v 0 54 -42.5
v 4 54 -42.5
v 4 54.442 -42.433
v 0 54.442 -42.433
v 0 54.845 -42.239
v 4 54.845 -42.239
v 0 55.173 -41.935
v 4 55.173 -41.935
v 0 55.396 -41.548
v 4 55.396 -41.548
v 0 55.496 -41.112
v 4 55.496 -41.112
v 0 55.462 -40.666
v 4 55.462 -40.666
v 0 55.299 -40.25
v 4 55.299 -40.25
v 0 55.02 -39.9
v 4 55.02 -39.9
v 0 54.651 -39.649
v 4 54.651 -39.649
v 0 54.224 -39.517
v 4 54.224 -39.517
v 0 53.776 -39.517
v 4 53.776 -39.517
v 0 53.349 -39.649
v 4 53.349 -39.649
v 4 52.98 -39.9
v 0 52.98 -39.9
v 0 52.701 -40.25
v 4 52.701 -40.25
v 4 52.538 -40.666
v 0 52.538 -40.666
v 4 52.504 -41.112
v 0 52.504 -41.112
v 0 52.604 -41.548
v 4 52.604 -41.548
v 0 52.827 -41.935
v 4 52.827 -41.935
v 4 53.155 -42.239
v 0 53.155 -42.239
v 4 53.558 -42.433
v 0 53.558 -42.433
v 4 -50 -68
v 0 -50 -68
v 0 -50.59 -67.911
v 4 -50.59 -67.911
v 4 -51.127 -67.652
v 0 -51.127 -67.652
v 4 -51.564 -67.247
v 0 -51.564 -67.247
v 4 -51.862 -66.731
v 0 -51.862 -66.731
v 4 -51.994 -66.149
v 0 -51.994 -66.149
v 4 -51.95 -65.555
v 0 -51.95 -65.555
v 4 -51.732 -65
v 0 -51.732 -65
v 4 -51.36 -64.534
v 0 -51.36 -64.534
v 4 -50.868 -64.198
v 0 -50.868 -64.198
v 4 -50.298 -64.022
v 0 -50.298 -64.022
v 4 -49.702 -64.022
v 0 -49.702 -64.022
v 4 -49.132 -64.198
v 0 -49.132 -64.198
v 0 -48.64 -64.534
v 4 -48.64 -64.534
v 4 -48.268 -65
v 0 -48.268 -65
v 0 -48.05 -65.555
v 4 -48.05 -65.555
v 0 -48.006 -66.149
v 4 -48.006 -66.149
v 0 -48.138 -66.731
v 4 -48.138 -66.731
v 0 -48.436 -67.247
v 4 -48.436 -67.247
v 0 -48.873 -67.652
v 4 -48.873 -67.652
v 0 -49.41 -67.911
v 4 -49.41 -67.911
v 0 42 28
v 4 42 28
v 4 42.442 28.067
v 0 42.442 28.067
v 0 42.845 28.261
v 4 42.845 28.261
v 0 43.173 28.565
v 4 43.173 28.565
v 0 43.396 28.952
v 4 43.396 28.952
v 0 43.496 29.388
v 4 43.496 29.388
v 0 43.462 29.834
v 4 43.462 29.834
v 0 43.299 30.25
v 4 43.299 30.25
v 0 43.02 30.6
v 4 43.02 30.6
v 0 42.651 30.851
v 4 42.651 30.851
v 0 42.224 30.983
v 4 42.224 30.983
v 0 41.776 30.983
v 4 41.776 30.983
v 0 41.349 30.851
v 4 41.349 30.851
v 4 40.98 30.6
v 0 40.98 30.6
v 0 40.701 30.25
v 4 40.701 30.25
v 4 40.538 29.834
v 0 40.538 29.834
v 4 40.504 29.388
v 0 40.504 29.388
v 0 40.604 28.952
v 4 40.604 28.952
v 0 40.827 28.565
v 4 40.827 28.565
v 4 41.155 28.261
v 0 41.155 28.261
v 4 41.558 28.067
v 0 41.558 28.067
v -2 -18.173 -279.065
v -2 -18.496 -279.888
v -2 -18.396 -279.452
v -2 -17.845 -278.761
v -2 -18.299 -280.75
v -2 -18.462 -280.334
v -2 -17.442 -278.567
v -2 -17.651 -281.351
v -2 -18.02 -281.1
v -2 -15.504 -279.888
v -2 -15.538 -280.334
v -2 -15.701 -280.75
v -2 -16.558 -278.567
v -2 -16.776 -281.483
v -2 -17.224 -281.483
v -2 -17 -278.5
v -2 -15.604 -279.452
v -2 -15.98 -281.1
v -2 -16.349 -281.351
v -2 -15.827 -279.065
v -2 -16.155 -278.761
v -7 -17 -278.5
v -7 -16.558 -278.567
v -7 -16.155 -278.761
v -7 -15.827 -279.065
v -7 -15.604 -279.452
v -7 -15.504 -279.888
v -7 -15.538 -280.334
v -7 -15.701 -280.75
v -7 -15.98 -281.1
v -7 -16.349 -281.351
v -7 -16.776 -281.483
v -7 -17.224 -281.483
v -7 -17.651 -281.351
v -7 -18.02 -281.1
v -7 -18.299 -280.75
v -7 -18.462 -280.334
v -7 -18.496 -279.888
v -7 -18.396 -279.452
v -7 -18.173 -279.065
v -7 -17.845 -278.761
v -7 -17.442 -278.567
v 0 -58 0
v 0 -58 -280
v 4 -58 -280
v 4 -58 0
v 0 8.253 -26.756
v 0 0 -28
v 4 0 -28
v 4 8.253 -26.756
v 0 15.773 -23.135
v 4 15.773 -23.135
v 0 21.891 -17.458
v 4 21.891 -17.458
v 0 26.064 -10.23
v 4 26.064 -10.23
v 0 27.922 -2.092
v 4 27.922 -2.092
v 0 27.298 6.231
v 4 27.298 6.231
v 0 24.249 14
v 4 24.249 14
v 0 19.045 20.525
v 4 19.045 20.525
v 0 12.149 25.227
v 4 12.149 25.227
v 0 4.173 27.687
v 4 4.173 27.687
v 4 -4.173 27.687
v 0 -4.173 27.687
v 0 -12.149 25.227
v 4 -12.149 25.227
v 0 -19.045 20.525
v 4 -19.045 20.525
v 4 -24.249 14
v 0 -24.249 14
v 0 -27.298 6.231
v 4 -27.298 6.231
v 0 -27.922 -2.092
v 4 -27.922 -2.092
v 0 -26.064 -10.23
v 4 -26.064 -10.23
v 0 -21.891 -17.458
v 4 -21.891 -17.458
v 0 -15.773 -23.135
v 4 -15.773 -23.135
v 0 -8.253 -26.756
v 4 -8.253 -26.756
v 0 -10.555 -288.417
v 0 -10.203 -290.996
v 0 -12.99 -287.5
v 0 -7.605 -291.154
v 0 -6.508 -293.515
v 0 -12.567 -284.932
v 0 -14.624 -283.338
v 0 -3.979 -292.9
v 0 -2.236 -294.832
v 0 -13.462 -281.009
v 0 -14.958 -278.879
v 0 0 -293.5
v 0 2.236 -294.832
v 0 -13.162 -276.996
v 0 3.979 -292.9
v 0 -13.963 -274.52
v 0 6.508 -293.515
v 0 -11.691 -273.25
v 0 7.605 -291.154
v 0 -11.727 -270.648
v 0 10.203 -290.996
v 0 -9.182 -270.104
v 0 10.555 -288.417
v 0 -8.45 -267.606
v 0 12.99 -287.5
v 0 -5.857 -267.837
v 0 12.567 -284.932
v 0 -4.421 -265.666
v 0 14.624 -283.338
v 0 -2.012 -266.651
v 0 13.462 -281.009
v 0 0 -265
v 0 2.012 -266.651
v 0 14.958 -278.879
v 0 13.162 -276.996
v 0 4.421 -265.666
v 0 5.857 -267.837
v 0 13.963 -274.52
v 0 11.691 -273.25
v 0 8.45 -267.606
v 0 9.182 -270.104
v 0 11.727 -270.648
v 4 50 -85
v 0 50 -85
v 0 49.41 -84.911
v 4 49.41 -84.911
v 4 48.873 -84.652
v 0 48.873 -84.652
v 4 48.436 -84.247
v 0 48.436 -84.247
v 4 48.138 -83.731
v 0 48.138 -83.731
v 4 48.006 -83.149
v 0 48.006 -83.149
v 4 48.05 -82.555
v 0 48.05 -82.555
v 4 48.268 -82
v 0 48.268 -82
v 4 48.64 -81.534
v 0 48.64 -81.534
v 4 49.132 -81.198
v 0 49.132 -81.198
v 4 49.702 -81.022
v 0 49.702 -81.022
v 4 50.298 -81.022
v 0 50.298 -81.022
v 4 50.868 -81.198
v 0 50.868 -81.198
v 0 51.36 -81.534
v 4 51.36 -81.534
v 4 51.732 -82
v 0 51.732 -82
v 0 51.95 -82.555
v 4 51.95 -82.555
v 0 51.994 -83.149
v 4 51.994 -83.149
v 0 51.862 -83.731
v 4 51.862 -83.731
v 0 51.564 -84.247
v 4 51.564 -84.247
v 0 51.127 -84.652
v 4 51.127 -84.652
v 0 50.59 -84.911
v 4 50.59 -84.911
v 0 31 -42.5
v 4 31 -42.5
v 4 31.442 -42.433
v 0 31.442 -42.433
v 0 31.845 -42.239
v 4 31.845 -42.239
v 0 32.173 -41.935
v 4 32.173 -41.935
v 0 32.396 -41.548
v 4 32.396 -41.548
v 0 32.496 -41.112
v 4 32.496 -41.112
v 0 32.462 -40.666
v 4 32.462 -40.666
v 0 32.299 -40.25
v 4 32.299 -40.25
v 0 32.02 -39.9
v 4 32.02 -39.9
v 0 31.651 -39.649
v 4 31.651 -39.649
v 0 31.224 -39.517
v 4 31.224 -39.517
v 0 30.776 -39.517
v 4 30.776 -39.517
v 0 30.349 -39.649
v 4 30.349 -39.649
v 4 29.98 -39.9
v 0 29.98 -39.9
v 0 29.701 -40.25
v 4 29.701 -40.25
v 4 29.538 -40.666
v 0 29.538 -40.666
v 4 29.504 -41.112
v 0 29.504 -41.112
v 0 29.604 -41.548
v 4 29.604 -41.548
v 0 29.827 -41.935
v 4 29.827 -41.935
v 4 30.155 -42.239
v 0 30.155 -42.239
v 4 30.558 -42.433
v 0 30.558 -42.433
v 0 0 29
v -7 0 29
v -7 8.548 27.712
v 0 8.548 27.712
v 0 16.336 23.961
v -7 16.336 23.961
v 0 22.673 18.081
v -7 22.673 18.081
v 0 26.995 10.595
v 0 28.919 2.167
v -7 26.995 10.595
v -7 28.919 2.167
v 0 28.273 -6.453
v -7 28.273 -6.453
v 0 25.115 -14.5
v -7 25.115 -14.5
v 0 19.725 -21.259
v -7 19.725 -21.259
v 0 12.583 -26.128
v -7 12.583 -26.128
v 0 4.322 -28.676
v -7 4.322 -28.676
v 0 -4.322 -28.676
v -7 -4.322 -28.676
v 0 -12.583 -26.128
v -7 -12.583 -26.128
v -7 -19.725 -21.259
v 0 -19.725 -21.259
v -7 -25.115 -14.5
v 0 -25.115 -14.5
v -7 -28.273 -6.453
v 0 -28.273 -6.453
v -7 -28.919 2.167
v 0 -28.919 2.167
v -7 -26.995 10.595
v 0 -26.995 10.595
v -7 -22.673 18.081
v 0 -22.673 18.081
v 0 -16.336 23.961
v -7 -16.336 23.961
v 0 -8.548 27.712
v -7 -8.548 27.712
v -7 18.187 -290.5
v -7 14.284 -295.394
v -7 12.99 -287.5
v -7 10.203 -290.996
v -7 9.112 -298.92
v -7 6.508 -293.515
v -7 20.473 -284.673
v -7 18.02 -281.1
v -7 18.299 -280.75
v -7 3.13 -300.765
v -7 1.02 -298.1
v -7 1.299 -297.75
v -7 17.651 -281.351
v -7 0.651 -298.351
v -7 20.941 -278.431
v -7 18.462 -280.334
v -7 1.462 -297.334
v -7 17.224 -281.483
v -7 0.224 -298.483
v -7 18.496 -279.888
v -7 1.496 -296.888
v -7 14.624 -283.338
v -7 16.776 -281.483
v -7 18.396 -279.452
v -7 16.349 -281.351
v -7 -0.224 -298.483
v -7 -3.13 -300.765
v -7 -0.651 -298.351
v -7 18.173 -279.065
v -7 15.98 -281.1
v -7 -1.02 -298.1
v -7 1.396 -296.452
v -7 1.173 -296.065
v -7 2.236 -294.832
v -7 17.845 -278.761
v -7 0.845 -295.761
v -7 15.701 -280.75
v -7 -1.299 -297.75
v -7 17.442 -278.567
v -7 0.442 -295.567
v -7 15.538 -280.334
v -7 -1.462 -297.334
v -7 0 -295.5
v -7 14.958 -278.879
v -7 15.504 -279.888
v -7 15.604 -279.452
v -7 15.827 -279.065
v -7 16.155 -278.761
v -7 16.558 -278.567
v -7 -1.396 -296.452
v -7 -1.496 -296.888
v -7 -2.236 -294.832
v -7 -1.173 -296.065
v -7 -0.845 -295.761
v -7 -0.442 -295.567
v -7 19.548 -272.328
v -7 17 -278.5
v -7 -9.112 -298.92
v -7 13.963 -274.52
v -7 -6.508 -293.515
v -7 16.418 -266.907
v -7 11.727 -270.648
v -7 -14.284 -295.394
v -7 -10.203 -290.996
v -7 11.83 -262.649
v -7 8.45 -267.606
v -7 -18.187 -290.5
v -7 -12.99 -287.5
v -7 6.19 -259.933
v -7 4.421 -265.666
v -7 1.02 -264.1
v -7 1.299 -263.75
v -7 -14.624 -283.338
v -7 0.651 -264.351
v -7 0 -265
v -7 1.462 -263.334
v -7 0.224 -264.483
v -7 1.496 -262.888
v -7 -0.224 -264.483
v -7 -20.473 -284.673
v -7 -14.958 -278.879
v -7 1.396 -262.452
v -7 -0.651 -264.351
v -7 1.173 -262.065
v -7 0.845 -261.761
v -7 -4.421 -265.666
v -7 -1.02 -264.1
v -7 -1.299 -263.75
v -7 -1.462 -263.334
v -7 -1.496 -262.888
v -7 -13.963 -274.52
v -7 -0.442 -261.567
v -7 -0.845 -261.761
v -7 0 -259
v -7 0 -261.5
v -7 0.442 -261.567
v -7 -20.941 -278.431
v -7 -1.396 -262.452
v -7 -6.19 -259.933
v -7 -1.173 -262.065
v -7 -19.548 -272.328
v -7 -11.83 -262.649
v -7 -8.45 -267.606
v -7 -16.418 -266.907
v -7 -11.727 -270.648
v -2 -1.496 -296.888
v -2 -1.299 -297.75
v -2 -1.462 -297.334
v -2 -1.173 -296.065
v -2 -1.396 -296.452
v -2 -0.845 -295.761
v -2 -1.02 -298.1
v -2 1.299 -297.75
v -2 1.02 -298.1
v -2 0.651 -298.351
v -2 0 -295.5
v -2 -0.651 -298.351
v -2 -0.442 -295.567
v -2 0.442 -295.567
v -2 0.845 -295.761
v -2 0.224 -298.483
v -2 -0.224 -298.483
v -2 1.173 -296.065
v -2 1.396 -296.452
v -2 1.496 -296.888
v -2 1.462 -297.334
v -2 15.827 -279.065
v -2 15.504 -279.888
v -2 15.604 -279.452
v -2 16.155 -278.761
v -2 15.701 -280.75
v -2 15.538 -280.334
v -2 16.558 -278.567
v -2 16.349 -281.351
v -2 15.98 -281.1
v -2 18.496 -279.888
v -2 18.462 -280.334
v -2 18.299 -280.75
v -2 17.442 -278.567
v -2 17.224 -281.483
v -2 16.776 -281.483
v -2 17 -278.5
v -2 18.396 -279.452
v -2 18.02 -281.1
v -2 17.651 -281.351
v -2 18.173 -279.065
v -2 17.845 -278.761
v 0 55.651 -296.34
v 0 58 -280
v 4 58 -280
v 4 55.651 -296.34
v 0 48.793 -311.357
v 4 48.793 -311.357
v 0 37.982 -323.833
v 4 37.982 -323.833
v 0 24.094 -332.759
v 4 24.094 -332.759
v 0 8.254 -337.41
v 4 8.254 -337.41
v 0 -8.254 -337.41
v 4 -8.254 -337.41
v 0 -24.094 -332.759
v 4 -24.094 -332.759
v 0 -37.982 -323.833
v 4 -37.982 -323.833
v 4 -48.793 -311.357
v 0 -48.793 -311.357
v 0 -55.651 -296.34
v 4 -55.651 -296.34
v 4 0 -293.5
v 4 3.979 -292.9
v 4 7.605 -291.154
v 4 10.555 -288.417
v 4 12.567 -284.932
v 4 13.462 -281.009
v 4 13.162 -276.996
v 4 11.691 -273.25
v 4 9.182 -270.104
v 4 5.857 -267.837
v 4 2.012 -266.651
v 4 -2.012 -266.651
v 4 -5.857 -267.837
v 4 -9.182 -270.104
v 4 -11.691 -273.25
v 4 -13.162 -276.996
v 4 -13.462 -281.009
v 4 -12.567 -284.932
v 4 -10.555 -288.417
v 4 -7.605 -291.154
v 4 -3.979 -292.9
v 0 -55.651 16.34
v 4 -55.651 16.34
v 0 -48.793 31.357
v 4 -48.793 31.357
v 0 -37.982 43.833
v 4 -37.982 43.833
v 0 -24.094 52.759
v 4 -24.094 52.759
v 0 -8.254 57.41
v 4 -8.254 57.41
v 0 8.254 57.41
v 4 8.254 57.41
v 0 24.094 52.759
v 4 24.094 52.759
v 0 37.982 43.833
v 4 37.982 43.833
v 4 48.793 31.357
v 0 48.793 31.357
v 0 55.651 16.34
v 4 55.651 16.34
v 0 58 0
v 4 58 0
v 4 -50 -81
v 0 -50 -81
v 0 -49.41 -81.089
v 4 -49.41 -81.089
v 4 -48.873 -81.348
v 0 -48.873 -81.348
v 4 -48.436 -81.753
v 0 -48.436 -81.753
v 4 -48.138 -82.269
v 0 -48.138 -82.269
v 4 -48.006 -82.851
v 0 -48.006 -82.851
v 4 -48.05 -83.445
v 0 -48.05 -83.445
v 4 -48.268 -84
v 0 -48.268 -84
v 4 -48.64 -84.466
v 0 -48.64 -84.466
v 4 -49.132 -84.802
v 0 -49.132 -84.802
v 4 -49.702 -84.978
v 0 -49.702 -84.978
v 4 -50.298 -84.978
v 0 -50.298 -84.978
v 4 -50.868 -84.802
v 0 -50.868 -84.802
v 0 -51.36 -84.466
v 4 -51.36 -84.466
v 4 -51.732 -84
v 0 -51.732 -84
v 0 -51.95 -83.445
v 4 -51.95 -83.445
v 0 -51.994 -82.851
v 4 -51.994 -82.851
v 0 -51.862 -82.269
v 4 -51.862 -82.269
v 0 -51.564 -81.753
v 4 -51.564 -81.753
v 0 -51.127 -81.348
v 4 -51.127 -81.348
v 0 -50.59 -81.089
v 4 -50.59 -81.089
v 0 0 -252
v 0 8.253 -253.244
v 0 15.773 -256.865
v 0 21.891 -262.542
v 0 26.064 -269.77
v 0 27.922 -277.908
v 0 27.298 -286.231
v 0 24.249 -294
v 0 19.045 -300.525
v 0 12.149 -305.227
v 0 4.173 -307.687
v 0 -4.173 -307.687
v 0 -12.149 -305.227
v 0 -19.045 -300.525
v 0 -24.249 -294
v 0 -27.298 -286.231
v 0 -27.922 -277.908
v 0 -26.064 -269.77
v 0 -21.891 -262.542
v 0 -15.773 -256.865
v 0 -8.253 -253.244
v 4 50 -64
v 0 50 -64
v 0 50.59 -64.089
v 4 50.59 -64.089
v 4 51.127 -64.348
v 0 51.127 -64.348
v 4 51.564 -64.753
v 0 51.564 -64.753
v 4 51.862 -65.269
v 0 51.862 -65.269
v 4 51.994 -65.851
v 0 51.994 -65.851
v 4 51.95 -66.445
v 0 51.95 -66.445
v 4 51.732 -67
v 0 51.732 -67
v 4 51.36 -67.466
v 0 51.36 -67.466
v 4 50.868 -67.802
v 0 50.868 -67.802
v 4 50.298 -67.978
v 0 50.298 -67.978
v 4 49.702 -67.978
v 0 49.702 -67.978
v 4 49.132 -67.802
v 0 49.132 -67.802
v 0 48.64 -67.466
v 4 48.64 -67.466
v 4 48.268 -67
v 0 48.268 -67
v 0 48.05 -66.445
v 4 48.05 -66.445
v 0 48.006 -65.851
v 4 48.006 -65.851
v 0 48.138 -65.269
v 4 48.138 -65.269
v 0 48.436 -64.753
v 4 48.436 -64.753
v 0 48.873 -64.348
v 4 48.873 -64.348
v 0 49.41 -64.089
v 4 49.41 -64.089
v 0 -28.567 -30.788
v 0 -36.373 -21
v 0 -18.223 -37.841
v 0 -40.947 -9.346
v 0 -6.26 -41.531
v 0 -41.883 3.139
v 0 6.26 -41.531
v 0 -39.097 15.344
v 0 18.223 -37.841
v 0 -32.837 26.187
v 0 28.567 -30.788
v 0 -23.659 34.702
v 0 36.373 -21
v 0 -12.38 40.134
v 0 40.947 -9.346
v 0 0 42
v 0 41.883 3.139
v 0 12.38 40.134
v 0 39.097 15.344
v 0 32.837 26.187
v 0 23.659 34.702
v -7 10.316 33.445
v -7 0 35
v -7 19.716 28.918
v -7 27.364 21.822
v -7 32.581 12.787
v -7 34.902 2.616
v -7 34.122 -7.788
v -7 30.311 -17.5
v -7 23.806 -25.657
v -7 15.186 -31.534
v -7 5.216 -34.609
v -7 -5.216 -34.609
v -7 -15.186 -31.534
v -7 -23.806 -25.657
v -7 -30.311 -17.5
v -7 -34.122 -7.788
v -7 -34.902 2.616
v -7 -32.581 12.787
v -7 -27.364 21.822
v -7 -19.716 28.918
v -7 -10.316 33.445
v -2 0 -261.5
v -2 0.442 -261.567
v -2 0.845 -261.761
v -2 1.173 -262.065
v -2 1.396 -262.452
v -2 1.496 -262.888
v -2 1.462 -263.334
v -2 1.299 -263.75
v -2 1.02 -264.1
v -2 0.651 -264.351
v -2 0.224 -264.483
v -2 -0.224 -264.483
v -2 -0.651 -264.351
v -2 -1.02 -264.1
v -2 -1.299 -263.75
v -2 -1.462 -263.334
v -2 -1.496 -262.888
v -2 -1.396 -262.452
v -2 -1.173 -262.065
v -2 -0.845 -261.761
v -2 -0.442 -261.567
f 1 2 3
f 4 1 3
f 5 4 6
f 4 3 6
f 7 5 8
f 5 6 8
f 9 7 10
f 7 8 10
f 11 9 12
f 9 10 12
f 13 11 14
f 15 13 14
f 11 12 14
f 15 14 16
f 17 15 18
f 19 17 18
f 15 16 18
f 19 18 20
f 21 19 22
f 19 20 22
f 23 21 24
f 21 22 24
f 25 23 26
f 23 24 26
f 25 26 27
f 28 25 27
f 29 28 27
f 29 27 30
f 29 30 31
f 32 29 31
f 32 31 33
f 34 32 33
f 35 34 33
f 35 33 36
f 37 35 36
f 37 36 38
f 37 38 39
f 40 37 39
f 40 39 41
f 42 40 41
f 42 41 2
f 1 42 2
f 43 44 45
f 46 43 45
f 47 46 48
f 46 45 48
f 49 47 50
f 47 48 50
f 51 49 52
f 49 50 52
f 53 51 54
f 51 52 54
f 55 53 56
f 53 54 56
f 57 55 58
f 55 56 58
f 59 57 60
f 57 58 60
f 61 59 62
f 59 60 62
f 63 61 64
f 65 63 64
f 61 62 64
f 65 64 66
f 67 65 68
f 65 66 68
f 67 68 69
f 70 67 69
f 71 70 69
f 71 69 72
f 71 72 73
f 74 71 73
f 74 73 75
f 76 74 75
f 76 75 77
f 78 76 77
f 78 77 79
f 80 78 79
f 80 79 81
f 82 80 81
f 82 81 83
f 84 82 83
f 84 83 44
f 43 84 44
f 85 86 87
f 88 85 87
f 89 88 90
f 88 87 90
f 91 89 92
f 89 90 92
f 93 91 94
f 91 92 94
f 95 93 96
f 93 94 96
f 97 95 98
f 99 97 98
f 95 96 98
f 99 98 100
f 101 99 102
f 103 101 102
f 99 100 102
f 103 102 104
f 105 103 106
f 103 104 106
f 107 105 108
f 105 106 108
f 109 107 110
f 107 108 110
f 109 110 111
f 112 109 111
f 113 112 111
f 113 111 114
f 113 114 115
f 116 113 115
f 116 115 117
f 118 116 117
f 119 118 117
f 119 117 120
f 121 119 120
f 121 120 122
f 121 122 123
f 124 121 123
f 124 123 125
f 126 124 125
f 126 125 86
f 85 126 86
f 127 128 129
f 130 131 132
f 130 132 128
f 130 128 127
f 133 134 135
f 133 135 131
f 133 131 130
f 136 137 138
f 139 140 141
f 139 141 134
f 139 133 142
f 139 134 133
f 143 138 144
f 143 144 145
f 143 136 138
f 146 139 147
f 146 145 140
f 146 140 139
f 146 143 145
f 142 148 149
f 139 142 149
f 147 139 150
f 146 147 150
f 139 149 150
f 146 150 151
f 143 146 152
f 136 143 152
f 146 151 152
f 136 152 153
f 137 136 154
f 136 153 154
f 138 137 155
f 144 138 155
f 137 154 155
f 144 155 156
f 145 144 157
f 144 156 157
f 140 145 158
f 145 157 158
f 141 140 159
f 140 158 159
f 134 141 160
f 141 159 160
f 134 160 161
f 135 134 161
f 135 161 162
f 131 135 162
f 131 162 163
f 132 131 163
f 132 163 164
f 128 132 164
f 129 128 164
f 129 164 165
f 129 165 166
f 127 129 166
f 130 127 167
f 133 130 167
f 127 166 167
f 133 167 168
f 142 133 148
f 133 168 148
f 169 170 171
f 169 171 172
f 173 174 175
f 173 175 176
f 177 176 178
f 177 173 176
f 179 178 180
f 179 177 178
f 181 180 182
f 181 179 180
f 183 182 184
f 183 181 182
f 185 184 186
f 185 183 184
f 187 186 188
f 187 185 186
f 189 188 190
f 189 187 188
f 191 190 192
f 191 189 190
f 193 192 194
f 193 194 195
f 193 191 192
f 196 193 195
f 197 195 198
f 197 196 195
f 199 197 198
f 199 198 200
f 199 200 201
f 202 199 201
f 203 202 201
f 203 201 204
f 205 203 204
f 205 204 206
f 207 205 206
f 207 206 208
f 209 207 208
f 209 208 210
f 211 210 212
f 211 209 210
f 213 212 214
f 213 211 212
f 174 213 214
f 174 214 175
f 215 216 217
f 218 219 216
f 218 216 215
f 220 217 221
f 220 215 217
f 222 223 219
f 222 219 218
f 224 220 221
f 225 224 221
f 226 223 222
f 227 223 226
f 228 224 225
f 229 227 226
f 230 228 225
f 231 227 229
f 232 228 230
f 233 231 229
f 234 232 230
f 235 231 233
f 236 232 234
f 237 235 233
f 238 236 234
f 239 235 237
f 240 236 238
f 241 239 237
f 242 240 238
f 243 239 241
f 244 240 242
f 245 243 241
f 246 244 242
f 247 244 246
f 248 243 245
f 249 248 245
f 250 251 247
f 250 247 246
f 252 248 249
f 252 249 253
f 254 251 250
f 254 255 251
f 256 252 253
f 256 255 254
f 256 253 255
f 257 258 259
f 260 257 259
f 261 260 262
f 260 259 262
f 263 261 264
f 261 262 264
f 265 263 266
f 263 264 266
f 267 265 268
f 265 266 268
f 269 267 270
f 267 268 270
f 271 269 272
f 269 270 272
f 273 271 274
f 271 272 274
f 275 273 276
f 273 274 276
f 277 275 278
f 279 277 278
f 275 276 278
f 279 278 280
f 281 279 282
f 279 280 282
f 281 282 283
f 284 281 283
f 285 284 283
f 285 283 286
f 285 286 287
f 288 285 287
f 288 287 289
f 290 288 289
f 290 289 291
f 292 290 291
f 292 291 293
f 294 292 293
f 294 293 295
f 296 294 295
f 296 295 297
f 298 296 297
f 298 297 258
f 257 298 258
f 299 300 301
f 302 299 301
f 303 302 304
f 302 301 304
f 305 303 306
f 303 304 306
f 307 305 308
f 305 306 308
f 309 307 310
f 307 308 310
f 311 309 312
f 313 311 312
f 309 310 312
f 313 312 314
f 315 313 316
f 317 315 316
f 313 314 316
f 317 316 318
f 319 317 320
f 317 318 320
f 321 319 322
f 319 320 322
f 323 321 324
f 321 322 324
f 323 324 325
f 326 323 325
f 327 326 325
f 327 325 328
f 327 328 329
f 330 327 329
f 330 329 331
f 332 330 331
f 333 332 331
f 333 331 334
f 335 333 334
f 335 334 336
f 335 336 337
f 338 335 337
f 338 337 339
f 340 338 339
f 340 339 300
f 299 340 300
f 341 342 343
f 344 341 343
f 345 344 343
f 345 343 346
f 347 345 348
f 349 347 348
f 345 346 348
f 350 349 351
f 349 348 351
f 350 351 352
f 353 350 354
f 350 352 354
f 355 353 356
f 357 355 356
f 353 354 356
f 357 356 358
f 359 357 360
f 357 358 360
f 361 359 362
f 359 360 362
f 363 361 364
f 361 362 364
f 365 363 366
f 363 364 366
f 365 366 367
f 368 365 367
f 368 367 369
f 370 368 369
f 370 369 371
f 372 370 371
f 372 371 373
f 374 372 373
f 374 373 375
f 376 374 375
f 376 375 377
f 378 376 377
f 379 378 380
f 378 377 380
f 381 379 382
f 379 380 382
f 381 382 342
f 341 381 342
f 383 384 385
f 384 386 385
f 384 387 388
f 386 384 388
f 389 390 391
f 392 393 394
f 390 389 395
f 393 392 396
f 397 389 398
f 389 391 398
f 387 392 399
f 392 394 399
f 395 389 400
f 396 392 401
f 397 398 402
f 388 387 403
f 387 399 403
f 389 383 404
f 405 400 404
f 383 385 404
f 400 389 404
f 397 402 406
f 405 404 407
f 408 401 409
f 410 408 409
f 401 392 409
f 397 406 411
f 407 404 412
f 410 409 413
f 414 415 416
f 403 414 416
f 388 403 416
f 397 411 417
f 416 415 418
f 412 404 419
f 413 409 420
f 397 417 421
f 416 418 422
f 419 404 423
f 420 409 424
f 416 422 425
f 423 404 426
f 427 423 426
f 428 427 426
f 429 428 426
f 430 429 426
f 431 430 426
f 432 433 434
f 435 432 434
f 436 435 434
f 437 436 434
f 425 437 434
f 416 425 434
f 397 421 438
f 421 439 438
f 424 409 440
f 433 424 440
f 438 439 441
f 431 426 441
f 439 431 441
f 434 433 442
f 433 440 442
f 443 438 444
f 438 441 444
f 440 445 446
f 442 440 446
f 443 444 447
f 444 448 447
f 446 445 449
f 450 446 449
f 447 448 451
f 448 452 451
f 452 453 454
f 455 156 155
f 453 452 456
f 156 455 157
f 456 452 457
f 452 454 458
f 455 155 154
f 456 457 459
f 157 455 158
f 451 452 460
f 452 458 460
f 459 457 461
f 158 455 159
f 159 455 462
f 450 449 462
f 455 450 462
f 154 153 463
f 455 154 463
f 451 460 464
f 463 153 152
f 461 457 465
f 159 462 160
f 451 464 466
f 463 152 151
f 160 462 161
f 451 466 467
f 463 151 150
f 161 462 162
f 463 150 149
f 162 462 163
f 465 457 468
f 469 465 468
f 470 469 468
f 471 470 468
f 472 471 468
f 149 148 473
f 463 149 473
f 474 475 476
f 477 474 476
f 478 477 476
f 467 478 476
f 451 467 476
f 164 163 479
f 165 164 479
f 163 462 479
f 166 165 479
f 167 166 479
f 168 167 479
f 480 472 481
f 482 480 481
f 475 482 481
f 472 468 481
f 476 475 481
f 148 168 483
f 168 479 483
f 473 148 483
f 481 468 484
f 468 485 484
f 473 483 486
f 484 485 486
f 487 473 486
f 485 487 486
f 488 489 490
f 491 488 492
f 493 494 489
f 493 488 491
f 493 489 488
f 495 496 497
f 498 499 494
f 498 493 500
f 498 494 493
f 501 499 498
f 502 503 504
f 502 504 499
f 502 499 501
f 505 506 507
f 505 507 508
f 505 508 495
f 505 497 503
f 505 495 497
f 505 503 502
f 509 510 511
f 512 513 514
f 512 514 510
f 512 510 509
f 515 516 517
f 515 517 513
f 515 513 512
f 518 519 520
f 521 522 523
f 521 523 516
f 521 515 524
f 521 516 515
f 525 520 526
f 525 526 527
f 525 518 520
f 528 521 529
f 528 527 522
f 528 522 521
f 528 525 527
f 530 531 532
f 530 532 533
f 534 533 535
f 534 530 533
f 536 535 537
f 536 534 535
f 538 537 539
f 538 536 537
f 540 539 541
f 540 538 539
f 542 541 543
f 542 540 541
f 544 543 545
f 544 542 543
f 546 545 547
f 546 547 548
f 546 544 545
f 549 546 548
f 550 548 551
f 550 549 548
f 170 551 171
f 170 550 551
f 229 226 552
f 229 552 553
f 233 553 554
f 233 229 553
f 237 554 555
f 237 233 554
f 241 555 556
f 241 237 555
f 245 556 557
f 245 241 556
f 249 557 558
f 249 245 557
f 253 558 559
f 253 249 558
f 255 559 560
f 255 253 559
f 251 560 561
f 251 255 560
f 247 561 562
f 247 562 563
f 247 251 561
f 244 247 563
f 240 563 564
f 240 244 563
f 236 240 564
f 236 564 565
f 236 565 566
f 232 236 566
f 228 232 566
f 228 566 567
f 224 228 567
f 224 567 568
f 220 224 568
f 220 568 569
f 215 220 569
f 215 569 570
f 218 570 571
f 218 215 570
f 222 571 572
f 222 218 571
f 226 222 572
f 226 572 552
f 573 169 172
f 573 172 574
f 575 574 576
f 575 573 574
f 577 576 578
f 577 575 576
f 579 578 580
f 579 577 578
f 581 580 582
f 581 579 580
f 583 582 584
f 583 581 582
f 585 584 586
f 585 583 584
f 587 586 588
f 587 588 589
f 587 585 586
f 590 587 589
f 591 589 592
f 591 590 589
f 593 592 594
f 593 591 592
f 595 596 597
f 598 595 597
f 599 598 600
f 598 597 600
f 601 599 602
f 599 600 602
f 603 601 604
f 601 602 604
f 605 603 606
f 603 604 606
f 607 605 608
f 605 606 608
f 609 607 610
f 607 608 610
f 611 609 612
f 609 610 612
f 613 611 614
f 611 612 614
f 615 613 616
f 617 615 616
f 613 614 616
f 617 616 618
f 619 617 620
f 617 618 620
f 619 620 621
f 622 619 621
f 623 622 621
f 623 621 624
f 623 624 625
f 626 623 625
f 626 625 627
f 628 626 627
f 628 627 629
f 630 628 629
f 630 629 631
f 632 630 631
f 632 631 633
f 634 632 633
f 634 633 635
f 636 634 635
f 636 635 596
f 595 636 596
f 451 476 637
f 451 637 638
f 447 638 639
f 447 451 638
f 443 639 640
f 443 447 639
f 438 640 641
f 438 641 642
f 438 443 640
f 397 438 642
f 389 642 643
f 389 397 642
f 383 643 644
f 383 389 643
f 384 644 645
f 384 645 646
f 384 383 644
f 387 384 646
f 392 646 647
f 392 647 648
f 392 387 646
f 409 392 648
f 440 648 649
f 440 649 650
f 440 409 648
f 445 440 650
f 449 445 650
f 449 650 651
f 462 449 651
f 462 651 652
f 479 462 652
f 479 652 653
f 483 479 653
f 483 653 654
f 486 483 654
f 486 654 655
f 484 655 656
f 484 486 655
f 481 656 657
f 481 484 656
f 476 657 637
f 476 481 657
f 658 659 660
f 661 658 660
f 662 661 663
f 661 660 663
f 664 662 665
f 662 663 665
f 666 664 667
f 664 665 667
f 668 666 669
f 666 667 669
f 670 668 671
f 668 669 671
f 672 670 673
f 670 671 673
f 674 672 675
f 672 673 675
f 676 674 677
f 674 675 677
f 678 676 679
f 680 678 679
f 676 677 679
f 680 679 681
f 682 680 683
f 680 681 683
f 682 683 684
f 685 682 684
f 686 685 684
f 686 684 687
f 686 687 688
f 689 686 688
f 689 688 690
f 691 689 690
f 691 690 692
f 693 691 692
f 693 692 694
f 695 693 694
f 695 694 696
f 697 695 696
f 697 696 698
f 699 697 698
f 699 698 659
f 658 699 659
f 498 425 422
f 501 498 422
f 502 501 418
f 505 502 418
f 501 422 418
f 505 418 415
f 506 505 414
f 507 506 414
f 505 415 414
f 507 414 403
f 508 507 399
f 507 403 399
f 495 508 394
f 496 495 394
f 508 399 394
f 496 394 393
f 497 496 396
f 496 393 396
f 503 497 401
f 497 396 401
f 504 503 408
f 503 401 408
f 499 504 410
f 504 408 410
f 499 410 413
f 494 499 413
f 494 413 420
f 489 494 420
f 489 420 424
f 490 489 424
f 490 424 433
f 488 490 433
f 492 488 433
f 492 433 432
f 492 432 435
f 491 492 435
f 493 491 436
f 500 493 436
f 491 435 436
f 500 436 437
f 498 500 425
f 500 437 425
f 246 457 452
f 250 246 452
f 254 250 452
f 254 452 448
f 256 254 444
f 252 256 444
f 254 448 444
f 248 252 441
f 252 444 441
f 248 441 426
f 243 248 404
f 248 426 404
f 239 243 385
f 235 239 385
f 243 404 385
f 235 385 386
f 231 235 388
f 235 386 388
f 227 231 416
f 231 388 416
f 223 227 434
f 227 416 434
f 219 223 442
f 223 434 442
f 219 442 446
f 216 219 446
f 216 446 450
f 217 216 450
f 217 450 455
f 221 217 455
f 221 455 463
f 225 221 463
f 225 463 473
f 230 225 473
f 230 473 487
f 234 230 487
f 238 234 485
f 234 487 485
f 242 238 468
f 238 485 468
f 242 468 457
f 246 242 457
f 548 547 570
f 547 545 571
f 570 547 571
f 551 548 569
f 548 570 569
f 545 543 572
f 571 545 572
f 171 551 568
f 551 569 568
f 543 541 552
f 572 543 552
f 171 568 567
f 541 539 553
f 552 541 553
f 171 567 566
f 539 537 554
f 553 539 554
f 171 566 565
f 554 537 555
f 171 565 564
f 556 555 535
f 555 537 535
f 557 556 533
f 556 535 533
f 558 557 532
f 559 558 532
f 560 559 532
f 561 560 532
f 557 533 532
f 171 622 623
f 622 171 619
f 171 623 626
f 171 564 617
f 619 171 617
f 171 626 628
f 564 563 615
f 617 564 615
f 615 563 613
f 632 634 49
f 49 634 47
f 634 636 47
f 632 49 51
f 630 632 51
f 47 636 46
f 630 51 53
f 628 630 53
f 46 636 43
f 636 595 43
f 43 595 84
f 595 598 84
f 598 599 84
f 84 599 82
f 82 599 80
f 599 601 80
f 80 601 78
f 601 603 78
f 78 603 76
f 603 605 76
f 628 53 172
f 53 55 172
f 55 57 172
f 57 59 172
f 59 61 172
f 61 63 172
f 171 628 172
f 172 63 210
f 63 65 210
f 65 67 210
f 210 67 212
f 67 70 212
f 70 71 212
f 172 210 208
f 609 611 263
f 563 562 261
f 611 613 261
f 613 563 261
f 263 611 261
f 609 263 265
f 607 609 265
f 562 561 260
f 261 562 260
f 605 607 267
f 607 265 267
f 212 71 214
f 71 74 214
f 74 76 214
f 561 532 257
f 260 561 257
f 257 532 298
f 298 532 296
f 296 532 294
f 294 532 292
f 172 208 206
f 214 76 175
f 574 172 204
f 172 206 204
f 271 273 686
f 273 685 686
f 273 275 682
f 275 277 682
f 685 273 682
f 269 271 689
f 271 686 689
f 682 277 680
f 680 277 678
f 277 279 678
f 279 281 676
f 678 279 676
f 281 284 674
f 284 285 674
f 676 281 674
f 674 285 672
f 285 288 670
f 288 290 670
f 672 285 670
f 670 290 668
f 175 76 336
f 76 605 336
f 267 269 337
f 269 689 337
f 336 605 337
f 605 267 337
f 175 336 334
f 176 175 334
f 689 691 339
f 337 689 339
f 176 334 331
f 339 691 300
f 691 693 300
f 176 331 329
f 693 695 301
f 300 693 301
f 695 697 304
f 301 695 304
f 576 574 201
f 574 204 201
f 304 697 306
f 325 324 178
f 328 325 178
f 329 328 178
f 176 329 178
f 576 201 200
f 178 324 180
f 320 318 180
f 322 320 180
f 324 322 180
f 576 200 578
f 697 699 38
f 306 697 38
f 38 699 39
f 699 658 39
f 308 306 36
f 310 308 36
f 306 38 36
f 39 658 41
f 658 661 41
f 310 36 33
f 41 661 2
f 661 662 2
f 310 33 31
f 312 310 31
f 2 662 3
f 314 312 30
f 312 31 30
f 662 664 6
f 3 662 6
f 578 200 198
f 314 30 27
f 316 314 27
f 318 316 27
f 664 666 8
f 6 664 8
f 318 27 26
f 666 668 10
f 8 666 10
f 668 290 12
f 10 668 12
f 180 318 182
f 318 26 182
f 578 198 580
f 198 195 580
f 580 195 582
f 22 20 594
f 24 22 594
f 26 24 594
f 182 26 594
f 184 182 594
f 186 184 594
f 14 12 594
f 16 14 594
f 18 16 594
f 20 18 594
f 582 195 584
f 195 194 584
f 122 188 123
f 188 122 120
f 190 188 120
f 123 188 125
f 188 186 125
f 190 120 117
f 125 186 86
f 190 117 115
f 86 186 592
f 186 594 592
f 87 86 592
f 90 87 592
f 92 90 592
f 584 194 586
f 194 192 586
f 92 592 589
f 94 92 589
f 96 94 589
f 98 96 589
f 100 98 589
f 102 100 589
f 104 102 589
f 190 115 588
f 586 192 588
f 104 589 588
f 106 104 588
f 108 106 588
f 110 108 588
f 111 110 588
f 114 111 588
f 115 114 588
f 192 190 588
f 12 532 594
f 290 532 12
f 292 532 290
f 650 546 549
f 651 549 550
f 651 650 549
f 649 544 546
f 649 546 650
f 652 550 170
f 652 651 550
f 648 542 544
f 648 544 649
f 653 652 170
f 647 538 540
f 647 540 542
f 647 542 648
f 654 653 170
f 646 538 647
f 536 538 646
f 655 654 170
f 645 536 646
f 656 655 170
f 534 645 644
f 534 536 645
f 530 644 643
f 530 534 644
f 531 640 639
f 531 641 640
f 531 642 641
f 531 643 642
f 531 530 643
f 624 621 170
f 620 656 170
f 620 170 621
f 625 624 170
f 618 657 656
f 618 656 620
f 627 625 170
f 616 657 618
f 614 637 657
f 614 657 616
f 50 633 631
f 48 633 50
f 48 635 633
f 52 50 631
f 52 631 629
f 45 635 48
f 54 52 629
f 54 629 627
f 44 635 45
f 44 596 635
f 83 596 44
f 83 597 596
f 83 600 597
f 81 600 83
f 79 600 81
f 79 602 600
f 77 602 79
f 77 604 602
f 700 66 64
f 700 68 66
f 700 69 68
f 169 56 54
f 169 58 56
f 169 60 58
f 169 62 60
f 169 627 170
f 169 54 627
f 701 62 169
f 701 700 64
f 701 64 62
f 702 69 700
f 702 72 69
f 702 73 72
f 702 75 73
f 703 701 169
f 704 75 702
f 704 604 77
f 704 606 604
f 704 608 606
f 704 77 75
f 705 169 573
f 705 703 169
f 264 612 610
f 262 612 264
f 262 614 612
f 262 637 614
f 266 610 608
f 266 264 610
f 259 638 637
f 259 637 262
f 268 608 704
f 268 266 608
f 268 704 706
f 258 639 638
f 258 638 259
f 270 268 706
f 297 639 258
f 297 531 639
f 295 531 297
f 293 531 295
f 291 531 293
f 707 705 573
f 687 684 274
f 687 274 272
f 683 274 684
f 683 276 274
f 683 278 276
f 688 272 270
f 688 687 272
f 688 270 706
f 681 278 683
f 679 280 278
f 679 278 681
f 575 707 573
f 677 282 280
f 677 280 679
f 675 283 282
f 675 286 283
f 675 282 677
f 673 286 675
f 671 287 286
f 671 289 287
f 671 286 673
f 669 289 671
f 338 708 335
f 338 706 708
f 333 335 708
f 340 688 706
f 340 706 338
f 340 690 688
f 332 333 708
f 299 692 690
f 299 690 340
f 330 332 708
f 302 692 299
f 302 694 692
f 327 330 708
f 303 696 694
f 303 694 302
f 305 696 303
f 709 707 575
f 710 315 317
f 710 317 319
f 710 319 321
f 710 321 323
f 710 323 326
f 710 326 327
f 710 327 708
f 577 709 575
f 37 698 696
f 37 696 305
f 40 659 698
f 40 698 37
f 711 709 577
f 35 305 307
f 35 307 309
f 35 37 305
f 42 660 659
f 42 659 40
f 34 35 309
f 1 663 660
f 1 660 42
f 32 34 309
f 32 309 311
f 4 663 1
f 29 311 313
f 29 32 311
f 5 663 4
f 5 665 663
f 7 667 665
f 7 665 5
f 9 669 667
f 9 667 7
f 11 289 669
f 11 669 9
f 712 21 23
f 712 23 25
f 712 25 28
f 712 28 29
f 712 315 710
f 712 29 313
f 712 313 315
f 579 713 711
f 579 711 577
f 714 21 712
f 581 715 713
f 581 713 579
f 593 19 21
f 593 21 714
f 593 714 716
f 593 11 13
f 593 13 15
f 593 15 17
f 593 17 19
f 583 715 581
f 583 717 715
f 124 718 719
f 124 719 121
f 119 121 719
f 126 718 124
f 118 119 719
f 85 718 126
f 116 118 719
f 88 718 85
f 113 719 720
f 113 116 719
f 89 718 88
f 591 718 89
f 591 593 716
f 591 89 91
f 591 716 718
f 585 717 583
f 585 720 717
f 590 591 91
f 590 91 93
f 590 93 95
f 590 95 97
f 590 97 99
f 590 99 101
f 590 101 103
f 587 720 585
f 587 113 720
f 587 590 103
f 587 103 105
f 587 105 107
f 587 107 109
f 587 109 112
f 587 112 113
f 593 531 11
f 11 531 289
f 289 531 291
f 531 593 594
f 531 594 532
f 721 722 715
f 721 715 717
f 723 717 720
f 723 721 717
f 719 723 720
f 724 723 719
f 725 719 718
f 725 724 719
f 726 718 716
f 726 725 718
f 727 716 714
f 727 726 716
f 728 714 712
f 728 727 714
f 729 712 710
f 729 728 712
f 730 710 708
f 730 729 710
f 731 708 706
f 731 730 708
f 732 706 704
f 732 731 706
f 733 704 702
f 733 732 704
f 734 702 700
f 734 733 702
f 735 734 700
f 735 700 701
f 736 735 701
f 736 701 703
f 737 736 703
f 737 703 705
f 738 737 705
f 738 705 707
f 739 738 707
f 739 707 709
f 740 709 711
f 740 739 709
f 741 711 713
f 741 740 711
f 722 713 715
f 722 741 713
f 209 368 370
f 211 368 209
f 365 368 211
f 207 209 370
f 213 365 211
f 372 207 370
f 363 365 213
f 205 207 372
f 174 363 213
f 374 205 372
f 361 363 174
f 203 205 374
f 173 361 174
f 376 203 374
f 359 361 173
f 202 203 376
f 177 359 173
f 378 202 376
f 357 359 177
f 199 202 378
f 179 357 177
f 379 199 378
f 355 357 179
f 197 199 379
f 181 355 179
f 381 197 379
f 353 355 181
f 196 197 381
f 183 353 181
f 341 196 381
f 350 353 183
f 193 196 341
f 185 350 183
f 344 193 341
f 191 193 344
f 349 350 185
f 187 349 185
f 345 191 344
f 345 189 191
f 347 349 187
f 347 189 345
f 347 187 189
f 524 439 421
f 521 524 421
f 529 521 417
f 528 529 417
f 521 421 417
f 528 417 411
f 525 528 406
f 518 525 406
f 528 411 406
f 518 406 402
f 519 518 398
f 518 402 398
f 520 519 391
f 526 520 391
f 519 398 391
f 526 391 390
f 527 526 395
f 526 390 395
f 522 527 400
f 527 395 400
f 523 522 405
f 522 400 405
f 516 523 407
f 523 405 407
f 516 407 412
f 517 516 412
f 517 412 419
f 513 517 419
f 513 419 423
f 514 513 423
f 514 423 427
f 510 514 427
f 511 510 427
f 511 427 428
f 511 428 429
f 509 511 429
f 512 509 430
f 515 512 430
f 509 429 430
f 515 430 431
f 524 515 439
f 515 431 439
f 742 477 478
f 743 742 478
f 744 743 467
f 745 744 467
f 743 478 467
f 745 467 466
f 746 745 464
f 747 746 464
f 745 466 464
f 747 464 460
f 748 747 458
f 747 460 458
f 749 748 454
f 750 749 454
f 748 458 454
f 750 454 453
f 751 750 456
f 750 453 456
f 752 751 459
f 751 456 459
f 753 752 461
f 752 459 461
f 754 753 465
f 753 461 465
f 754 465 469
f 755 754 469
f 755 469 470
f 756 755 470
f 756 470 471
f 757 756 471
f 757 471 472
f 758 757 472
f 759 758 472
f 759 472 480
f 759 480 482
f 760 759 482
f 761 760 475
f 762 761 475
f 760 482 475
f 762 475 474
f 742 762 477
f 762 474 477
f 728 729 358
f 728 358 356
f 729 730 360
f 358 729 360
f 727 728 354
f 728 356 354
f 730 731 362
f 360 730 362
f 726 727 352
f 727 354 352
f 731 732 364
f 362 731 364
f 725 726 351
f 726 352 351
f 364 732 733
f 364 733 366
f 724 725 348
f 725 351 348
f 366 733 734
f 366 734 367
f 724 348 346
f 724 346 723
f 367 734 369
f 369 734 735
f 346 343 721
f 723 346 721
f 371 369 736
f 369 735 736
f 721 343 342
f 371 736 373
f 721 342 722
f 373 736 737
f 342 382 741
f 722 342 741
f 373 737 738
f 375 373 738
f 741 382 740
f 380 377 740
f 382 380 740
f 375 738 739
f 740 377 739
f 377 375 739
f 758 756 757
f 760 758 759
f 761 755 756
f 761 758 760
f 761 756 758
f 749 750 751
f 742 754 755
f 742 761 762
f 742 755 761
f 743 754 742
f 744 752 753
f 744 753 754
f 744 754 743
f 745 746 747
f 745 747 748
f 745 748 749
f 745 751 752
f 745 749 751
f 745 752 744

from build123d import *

# Parameters (mm, degrees)
SKETCH1_R           = 28
SKETCH1_R_2         = 13.5
BOSS_EXTRUDE1_DEPTH = 4
SKETCH2_R           = 34
SKETCH2_R_2         = 29
SKETCH2_R_3         = 20
SKETCH2_R_4         = 15
BOSS_EXTRUDE2_DEPTH = 7
CHAMFER1_SIZE       = 8
SKETCH3_R           = 2
CUT_EXTRUDE1_DEPTH  = 344.011661609
SKETCH4_R           = 1.5
CUT_EXTRUDE2_DEPTH  = 344.116598258
SKETCH5_R           = 1.5
CUT_EXTRUDE3_DEPTH  = 5


with BuildPart() as part:
    # Sketch1 → Boss-Extrude1 (new body)
    with BuildSketch(Plane(origin=(0, 0, 0), x_dir=(0, 0, -1), z_dir=(1, 0, 0))):
        with BuildLine():
            Line((0, 58), (280, 58))
            ThreePointArc((280, 58), (338, 0), (280, -58))
            Line((280, -58), (0, -58))
            ThreePointArc((0, -58), (-58, 0), (0, 58))
        make_face()
        Circle(SKETCH1_R, mode=Mode.SUBTRACT)
        with Locations((280, 0)):
            Circle(SKETCH1_R_2, mode=Mode.SUBTRACT)
    extrude(amount=BOSS_EXTRUDE1_DEPTH)

    # Sketch2 → Boss-Extrude2 (add)
    # profile 1 of 2: a face of its own
    with BuildSketch(Plane.ZY.offset(7)):
        Circle(SKETCH2_R)
        Circle(SKETCH2_R_2, mode=Mode.SUBTRACT)
    # profile 2 of 2: a face of its own
    with BuildSketch(Plane.ZY.offset(7)):
        with Locations((-280, 0)):
            Circle(SKETCH2_R_3)
        with Locations((-280, 0)):
            Circle(SKETCH2_R_4, mode=Mode.SUBTRACT)
    extrude(amount=-BOSS_EXTRUDE2_DEPTH)

    # Chamfer1
    # the kernel refuses this chamfer: 8 mm, written as the material it adds along each edge
    with BuildSketch(Plane(origin=(0, 0, 0), x_dir=(0, 0, 1), z_dir=(0, -1, 0))) as chamfer1_piece_1_section:
        Polygon((34 + CHAMFER1_SIZE, 0), (34, CHAMFER1_SIZE), (34, 0), align=None)
    chamfer1_piece_1 = revolve(axis=Axis((0, 0, 0), (-1, 0, 0)), mode=Mode.PRIVATE)
    chamfer1_piece_1 = split(chamfer1_piece_1, bisect_by=Plane(origin=(-7, 0, -38.472213865), z_dir=(1, 0, 0)), keep=Keep.TOP, mode=Mode.PRIVATE)
    add(chamfer1_piece_1)
    with BuildSketch(Plane(origin=(0, 0, -280), x_dir=(0, 0, 1), z_dir=(0, -1, 0))) as chamfer1_piece_2_section:
        Polygon((20 + CHAMFER1_SIZE, 0), (20, CHAMFER1_SIZE), (20, 0), align=None)
    chamfer1_piece_2 = revolve(axis=Axis((0, 0, -280), (-1, 0, 0)), mode=Mode.PRIVATE)
    chamfer1_piece_2 = split(chamfer1_piece_2, bisect_by=Plane(origin=(-7, 0, -304.493064149), z_dir=(1, 0, 0)), keep=Keep.TOP, mode=Mode.PRIVATE)
    add(chamfer1_piece_2)

    # Sketch3 → Cut-Extrude1 (cut, through all)
    with BuildSketch(Plane.ZY):
        with Locations((-66, 50)):
            Circle(SKETCH3_R)
        with Locations(Location((-66, -50, 0), (0, 0, 180))):
            Circle(SKETCH3_R)
        with Locations((-83, -50)):
            Circle(SKETCH3_R)
        with Locations(Location((-83, 50, 0), (0, 0, 180))):
            Circle(SKETCH3_R)
    extrude(amount=-CUT_EXTRUDE1_DEPTH, mode=Mode.SUBTRACT)

    # Sketch4 → Cut-Extrude2 (cut, through all)
    with BuildSketch(Plane(origin=(4, 0, 0), x_dir=(0, 0, -1), z_dir=(1, 0, 0))):
        with Locations((-29.5, 42)):
            Circle(SKETCH4_R)
        with Locations((41, 54)):
            Circle(SKETCH4_R)
        with Locations((41, 31)):
            Circle(SKETCH4_R)
    extrude(amount=-CUT_EXTRUDE2_DEPTH, mode=Mode.SUBTRACT)

    # Sketch5 → Cut-Extrude3 (cut)
    with BuildSketch(Plane.ZY.offset(7)):
        with Locations((-280, 17)):
            Circle(SKETCH5_R)
        with Locations((-263, 0)):
            Circle(SKETCH5_R)
        with Locations((-280, -17)):
            Circle(SKETCH5_R)
        with Locations((-297, 0)):
            Circle(SKETCH5_R)
    extrude(amount=-CUT_EXTRUDE3_DEPTH, mode=Mode.SUBTRACT)


solid = part.part
